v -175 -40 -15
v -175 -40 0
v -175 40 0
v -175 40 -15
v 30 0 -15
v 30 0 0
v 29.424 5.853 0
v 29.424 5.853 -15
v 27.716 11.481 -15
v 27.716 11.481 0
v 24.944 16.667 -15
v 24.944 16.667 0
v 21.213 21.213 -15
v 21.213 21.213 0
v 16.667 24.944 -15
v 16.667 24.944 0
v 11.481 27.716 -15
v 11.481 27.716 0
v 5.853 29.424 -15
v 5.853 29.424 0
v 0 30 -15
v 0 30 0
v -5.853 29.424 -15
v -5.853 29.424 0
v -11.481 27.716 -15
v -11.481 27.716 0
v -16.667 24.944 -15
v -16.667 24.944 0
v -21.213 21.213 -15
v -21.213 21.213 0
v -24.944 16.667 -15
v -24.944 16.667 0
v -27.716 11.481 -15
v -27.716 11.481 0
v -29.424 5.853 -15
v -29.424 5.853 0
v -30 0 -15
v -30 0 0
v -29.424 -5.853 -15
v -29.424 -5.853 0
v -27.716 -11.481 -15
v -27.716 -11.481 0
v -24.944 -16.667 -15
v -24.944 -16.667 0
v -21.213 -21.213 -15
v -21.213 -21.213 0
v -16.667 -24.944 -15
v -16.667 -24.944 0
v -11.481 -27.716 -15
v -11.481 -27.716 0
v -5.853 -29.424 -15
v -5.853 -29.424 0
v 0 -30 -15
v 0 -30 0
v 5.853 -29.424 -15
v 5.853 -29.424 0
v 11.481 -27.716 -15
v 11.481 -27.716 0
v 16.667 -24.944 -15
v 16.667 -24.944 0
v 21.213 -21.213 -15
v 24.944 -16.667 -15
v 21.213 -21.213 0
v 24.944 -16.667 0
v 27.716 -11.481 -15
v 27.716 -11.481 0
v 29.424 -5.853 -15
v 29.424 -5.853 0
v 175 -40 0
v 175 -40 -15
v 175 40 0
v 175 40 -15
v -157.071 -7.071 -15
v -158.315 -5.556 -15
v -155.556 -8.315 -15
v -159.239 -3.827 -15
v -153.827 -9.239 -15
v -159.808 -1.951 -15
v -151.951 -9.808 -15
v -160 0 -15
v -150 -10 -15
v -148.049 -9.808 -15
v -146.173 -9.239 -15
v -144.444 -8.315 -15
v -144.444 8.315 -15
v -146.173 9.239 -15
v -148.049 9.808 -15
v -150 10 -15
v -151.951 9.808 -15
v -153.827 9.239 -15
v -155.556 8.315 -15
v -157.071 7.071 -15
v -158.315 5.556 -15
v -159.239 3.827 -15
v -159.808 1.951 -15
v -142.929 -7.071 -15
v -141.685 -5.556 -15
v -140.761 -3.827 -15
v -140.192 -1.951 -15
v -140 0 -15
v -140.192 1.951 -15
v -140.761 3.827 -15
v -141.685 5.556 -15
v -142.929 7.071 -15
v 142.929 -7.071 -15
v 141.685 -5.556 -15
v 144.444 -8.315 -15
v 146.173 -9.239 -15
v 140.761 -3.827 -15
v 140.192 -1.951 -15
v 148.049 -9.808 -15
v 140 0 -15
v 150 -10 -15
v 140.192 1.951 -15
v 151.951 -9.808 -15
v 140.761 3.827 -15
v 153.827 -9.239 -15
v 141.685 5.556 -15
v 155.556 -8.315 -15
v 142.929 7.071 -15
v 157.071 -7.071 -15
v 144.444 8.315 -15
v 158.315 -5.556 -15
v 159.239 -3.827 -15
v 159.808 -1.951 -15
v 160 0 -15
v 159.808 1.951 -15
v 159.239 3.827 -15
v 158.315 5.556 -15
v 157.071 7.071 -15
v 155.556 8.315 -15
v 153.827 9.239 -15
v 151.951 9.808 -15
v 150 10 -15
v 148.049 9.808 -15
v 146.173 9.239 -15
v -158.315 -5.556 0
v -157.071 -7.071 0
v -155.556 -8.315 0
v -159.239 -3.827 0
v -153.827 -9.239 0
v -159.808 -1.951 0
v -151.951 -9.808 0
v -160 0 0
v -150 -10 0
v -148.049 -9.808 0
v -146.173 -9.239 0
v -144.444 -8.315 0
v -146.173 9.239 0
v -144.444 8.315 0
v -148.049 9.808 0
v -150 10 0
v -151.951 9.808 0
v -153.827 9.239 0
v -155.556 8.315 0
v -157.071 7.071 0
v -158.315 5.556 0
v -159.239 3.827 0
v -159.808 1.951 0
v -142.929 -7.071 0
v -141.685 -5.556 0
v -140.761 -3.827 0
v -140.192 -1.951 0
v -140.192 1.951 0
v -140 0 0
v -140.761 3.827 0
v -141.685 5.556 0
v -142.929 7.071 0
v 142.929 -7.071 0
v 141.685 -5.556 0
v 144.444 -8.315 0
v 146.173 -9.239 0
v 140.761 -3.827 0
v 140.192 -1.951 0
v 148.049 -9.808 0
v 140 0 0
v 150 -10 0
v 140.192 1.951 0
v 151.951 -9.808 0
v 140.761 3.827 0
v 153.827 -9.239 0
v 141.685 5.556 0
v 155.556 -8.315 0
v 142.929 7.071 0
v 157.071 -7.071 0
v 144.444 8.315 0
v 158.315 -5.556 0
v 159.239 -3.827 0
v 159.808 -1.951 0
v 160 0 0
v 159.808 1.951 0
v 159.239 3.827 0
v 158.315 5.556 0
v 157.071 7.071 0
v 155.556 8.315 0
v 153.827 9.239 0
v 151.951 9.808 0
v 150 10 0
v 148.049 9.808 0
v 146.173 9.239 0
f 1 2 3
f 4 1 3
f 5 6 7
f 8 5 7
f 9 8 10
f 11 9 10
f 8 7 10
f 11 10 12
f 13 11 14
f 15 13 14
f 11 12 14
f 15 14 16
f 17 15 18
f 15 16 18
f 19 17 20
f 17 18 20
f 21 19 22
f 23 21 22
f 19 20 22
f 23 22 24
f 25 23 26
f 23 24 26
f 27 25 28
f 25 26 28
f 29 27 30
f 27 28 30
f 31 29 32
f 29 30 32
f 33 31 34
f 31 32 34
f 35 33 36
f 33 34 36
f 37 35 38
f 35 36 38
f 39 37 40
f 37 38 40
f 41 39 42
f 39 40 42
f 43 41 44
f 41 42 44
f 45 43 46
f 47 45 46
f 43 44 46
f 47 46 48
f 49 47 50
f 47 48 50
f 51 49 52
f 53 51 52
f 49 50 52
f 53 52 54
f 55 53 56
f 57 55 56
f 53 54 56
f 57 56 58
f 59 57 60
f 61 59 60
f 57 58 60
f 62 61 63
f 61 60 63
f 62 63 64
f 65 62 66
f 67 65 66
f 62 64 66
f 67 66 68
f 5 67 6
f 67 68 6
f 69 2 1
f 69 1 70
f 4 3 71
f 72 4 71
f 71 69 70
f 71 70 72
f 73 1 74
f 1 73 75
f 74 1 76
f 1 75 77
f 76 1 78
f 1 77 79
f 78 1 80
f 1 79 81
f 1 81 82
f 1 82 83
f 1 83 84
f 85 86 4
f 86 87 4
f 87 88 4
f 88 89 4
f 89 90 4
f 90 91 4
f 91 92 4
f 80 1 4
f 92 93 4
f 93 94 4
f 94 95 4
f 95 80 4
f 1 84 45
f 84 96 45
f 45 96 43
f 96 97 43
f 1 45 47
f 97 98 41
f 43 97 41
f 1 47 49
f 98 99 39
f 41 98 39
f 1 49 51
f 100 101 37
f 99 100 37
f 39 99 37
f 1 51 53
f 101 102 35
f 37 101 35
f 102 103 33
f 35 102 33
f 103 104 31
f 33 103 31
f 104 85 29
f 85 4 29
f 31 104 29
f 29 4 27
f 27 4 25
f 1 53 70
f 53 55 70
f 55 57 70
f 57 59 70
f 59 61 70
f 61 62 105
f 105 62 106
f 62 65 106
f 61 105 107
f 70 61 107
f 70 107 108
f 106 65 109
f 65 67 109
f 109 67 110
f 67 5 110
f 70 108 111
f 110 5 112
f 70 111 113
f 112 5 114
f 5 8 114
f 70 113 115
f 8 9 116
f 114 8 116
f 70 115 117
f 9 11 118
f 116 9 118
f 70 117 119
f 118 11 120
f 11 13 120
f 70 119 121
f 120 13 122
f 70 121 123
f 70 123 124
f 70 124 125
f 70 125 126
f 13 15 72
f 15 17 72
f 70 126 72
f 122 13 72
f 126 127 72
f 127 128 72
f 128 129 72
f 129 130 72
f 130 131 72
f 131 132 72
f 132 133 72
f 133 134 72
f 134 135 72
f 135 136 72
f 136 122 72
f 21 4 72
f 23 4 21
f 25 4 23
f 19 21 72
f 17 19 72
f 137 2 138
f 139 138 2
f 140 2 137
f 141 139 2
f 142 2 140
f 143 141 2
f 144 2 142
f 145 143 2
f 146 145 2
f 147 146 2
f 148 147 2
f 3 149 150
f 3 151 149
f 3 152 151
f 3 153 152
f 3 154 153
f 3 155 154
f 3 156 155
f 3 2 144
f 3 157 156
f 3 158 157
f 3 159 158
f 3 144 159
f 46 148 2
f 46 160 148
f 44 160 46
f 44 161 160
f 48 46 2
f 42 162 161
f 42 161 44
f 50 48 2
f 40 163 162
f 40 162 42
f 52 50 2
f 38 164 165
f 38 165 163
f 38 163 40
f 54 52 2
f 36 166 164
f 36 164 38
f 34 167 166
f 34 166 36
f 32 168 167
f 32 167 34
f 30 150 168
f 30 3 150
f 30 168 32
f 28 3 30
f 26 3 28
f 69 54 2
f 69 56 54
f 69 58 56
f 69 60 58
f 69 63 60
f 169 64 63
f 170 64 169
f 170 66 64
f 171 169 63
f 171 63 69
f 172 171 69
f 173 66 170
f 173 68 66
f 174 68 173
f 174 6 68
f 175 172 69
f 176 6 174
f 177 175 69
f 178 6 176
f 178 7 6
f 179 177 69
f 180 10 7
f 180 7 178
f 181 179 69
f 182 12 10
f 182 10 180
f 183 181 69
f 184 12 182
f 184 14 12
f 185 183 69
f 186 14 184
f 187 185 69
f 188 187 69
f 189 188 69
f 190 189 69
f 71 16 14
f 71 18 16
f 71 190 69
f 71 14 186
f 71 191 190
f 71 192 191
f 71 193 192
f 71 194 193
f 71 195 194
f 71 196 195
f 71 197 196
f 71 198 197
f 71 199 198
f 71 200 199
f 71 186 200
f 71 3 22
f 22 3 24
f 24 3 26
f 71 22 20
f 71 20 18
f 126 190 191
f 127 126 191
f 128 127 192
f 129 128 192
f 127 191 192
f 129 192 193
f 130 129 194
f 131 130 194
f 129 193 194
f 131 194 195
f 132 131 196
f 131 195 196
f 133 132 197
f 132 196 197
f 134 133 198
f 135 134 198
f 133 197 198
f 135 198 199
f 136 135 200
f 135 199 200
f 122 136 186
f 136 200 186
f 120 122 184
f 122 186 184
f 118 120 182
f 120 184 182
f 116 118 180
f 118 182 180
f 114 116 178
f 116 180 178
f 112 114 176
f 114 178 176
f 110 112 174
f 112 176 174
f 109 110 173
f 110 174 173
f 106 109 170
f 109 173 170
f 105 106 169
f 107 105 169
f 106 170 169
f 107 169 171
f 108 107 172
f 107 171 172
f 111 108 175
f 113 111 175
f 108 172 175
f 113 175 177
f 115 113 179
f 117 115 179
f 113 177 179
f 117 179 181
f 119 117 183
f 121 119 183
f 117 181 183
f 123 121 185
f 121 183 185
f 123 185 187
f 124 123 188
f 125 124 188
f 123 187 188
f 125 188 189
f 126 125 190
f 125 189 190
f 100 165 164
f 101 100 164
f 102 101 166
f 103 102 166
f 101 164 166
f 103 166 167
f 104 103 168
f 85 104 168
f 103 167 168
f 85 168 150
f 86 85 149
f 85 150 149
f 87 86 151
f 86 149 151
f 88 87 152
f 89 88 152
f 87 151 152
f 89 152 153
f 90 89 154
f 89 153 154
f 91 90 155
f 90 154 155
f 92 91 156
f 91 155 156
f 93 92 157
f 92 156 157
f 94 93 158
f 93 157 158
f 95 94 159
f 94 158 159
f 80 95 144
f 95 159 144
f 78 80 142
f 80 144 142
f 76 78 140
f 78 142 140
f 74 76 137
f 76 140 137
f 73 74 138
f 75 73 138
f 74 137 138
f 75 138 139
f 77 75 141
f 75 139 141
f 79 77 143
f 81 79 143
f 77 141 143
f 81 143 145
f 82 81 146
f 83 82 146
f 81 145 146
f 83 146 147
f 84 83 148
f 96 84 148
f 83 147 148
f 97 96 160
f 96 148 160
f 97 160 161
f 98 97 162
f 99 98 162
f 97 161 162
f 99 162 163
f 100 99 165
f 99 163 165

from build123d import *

# Parameters (mm, degrees)
CROQUIS1_W              = 350
CROQUIS1_H              = 80
CROQUIS1_R              = 30
CROQUIS1_R_2            = 10
SALIENTE_EXTRUIR1_DEPTH = 15


with BuildPart() as part:
    # Croquis1 → Saliente-Extruir1 (new body)
    with BuildSketch(Plane.XY):
        Rectangle(CROQUIS1_W, CROQUIS1_H)
        Circle(CROQUIS1_R, mode=Mode.SUBTRACT)
        with Locations((150, 0)):
            Circle(CROQUIS1_R_2, mode=Mode.SUBTRACT)
        with Locations((-150, 0)):
            Circle(CROQUIS1_R_2, mode=Mode.SUBTRACT)
    extrude(amount=-SALIENTE_EXTRUIR1_DEPTH)


solid = part.part
